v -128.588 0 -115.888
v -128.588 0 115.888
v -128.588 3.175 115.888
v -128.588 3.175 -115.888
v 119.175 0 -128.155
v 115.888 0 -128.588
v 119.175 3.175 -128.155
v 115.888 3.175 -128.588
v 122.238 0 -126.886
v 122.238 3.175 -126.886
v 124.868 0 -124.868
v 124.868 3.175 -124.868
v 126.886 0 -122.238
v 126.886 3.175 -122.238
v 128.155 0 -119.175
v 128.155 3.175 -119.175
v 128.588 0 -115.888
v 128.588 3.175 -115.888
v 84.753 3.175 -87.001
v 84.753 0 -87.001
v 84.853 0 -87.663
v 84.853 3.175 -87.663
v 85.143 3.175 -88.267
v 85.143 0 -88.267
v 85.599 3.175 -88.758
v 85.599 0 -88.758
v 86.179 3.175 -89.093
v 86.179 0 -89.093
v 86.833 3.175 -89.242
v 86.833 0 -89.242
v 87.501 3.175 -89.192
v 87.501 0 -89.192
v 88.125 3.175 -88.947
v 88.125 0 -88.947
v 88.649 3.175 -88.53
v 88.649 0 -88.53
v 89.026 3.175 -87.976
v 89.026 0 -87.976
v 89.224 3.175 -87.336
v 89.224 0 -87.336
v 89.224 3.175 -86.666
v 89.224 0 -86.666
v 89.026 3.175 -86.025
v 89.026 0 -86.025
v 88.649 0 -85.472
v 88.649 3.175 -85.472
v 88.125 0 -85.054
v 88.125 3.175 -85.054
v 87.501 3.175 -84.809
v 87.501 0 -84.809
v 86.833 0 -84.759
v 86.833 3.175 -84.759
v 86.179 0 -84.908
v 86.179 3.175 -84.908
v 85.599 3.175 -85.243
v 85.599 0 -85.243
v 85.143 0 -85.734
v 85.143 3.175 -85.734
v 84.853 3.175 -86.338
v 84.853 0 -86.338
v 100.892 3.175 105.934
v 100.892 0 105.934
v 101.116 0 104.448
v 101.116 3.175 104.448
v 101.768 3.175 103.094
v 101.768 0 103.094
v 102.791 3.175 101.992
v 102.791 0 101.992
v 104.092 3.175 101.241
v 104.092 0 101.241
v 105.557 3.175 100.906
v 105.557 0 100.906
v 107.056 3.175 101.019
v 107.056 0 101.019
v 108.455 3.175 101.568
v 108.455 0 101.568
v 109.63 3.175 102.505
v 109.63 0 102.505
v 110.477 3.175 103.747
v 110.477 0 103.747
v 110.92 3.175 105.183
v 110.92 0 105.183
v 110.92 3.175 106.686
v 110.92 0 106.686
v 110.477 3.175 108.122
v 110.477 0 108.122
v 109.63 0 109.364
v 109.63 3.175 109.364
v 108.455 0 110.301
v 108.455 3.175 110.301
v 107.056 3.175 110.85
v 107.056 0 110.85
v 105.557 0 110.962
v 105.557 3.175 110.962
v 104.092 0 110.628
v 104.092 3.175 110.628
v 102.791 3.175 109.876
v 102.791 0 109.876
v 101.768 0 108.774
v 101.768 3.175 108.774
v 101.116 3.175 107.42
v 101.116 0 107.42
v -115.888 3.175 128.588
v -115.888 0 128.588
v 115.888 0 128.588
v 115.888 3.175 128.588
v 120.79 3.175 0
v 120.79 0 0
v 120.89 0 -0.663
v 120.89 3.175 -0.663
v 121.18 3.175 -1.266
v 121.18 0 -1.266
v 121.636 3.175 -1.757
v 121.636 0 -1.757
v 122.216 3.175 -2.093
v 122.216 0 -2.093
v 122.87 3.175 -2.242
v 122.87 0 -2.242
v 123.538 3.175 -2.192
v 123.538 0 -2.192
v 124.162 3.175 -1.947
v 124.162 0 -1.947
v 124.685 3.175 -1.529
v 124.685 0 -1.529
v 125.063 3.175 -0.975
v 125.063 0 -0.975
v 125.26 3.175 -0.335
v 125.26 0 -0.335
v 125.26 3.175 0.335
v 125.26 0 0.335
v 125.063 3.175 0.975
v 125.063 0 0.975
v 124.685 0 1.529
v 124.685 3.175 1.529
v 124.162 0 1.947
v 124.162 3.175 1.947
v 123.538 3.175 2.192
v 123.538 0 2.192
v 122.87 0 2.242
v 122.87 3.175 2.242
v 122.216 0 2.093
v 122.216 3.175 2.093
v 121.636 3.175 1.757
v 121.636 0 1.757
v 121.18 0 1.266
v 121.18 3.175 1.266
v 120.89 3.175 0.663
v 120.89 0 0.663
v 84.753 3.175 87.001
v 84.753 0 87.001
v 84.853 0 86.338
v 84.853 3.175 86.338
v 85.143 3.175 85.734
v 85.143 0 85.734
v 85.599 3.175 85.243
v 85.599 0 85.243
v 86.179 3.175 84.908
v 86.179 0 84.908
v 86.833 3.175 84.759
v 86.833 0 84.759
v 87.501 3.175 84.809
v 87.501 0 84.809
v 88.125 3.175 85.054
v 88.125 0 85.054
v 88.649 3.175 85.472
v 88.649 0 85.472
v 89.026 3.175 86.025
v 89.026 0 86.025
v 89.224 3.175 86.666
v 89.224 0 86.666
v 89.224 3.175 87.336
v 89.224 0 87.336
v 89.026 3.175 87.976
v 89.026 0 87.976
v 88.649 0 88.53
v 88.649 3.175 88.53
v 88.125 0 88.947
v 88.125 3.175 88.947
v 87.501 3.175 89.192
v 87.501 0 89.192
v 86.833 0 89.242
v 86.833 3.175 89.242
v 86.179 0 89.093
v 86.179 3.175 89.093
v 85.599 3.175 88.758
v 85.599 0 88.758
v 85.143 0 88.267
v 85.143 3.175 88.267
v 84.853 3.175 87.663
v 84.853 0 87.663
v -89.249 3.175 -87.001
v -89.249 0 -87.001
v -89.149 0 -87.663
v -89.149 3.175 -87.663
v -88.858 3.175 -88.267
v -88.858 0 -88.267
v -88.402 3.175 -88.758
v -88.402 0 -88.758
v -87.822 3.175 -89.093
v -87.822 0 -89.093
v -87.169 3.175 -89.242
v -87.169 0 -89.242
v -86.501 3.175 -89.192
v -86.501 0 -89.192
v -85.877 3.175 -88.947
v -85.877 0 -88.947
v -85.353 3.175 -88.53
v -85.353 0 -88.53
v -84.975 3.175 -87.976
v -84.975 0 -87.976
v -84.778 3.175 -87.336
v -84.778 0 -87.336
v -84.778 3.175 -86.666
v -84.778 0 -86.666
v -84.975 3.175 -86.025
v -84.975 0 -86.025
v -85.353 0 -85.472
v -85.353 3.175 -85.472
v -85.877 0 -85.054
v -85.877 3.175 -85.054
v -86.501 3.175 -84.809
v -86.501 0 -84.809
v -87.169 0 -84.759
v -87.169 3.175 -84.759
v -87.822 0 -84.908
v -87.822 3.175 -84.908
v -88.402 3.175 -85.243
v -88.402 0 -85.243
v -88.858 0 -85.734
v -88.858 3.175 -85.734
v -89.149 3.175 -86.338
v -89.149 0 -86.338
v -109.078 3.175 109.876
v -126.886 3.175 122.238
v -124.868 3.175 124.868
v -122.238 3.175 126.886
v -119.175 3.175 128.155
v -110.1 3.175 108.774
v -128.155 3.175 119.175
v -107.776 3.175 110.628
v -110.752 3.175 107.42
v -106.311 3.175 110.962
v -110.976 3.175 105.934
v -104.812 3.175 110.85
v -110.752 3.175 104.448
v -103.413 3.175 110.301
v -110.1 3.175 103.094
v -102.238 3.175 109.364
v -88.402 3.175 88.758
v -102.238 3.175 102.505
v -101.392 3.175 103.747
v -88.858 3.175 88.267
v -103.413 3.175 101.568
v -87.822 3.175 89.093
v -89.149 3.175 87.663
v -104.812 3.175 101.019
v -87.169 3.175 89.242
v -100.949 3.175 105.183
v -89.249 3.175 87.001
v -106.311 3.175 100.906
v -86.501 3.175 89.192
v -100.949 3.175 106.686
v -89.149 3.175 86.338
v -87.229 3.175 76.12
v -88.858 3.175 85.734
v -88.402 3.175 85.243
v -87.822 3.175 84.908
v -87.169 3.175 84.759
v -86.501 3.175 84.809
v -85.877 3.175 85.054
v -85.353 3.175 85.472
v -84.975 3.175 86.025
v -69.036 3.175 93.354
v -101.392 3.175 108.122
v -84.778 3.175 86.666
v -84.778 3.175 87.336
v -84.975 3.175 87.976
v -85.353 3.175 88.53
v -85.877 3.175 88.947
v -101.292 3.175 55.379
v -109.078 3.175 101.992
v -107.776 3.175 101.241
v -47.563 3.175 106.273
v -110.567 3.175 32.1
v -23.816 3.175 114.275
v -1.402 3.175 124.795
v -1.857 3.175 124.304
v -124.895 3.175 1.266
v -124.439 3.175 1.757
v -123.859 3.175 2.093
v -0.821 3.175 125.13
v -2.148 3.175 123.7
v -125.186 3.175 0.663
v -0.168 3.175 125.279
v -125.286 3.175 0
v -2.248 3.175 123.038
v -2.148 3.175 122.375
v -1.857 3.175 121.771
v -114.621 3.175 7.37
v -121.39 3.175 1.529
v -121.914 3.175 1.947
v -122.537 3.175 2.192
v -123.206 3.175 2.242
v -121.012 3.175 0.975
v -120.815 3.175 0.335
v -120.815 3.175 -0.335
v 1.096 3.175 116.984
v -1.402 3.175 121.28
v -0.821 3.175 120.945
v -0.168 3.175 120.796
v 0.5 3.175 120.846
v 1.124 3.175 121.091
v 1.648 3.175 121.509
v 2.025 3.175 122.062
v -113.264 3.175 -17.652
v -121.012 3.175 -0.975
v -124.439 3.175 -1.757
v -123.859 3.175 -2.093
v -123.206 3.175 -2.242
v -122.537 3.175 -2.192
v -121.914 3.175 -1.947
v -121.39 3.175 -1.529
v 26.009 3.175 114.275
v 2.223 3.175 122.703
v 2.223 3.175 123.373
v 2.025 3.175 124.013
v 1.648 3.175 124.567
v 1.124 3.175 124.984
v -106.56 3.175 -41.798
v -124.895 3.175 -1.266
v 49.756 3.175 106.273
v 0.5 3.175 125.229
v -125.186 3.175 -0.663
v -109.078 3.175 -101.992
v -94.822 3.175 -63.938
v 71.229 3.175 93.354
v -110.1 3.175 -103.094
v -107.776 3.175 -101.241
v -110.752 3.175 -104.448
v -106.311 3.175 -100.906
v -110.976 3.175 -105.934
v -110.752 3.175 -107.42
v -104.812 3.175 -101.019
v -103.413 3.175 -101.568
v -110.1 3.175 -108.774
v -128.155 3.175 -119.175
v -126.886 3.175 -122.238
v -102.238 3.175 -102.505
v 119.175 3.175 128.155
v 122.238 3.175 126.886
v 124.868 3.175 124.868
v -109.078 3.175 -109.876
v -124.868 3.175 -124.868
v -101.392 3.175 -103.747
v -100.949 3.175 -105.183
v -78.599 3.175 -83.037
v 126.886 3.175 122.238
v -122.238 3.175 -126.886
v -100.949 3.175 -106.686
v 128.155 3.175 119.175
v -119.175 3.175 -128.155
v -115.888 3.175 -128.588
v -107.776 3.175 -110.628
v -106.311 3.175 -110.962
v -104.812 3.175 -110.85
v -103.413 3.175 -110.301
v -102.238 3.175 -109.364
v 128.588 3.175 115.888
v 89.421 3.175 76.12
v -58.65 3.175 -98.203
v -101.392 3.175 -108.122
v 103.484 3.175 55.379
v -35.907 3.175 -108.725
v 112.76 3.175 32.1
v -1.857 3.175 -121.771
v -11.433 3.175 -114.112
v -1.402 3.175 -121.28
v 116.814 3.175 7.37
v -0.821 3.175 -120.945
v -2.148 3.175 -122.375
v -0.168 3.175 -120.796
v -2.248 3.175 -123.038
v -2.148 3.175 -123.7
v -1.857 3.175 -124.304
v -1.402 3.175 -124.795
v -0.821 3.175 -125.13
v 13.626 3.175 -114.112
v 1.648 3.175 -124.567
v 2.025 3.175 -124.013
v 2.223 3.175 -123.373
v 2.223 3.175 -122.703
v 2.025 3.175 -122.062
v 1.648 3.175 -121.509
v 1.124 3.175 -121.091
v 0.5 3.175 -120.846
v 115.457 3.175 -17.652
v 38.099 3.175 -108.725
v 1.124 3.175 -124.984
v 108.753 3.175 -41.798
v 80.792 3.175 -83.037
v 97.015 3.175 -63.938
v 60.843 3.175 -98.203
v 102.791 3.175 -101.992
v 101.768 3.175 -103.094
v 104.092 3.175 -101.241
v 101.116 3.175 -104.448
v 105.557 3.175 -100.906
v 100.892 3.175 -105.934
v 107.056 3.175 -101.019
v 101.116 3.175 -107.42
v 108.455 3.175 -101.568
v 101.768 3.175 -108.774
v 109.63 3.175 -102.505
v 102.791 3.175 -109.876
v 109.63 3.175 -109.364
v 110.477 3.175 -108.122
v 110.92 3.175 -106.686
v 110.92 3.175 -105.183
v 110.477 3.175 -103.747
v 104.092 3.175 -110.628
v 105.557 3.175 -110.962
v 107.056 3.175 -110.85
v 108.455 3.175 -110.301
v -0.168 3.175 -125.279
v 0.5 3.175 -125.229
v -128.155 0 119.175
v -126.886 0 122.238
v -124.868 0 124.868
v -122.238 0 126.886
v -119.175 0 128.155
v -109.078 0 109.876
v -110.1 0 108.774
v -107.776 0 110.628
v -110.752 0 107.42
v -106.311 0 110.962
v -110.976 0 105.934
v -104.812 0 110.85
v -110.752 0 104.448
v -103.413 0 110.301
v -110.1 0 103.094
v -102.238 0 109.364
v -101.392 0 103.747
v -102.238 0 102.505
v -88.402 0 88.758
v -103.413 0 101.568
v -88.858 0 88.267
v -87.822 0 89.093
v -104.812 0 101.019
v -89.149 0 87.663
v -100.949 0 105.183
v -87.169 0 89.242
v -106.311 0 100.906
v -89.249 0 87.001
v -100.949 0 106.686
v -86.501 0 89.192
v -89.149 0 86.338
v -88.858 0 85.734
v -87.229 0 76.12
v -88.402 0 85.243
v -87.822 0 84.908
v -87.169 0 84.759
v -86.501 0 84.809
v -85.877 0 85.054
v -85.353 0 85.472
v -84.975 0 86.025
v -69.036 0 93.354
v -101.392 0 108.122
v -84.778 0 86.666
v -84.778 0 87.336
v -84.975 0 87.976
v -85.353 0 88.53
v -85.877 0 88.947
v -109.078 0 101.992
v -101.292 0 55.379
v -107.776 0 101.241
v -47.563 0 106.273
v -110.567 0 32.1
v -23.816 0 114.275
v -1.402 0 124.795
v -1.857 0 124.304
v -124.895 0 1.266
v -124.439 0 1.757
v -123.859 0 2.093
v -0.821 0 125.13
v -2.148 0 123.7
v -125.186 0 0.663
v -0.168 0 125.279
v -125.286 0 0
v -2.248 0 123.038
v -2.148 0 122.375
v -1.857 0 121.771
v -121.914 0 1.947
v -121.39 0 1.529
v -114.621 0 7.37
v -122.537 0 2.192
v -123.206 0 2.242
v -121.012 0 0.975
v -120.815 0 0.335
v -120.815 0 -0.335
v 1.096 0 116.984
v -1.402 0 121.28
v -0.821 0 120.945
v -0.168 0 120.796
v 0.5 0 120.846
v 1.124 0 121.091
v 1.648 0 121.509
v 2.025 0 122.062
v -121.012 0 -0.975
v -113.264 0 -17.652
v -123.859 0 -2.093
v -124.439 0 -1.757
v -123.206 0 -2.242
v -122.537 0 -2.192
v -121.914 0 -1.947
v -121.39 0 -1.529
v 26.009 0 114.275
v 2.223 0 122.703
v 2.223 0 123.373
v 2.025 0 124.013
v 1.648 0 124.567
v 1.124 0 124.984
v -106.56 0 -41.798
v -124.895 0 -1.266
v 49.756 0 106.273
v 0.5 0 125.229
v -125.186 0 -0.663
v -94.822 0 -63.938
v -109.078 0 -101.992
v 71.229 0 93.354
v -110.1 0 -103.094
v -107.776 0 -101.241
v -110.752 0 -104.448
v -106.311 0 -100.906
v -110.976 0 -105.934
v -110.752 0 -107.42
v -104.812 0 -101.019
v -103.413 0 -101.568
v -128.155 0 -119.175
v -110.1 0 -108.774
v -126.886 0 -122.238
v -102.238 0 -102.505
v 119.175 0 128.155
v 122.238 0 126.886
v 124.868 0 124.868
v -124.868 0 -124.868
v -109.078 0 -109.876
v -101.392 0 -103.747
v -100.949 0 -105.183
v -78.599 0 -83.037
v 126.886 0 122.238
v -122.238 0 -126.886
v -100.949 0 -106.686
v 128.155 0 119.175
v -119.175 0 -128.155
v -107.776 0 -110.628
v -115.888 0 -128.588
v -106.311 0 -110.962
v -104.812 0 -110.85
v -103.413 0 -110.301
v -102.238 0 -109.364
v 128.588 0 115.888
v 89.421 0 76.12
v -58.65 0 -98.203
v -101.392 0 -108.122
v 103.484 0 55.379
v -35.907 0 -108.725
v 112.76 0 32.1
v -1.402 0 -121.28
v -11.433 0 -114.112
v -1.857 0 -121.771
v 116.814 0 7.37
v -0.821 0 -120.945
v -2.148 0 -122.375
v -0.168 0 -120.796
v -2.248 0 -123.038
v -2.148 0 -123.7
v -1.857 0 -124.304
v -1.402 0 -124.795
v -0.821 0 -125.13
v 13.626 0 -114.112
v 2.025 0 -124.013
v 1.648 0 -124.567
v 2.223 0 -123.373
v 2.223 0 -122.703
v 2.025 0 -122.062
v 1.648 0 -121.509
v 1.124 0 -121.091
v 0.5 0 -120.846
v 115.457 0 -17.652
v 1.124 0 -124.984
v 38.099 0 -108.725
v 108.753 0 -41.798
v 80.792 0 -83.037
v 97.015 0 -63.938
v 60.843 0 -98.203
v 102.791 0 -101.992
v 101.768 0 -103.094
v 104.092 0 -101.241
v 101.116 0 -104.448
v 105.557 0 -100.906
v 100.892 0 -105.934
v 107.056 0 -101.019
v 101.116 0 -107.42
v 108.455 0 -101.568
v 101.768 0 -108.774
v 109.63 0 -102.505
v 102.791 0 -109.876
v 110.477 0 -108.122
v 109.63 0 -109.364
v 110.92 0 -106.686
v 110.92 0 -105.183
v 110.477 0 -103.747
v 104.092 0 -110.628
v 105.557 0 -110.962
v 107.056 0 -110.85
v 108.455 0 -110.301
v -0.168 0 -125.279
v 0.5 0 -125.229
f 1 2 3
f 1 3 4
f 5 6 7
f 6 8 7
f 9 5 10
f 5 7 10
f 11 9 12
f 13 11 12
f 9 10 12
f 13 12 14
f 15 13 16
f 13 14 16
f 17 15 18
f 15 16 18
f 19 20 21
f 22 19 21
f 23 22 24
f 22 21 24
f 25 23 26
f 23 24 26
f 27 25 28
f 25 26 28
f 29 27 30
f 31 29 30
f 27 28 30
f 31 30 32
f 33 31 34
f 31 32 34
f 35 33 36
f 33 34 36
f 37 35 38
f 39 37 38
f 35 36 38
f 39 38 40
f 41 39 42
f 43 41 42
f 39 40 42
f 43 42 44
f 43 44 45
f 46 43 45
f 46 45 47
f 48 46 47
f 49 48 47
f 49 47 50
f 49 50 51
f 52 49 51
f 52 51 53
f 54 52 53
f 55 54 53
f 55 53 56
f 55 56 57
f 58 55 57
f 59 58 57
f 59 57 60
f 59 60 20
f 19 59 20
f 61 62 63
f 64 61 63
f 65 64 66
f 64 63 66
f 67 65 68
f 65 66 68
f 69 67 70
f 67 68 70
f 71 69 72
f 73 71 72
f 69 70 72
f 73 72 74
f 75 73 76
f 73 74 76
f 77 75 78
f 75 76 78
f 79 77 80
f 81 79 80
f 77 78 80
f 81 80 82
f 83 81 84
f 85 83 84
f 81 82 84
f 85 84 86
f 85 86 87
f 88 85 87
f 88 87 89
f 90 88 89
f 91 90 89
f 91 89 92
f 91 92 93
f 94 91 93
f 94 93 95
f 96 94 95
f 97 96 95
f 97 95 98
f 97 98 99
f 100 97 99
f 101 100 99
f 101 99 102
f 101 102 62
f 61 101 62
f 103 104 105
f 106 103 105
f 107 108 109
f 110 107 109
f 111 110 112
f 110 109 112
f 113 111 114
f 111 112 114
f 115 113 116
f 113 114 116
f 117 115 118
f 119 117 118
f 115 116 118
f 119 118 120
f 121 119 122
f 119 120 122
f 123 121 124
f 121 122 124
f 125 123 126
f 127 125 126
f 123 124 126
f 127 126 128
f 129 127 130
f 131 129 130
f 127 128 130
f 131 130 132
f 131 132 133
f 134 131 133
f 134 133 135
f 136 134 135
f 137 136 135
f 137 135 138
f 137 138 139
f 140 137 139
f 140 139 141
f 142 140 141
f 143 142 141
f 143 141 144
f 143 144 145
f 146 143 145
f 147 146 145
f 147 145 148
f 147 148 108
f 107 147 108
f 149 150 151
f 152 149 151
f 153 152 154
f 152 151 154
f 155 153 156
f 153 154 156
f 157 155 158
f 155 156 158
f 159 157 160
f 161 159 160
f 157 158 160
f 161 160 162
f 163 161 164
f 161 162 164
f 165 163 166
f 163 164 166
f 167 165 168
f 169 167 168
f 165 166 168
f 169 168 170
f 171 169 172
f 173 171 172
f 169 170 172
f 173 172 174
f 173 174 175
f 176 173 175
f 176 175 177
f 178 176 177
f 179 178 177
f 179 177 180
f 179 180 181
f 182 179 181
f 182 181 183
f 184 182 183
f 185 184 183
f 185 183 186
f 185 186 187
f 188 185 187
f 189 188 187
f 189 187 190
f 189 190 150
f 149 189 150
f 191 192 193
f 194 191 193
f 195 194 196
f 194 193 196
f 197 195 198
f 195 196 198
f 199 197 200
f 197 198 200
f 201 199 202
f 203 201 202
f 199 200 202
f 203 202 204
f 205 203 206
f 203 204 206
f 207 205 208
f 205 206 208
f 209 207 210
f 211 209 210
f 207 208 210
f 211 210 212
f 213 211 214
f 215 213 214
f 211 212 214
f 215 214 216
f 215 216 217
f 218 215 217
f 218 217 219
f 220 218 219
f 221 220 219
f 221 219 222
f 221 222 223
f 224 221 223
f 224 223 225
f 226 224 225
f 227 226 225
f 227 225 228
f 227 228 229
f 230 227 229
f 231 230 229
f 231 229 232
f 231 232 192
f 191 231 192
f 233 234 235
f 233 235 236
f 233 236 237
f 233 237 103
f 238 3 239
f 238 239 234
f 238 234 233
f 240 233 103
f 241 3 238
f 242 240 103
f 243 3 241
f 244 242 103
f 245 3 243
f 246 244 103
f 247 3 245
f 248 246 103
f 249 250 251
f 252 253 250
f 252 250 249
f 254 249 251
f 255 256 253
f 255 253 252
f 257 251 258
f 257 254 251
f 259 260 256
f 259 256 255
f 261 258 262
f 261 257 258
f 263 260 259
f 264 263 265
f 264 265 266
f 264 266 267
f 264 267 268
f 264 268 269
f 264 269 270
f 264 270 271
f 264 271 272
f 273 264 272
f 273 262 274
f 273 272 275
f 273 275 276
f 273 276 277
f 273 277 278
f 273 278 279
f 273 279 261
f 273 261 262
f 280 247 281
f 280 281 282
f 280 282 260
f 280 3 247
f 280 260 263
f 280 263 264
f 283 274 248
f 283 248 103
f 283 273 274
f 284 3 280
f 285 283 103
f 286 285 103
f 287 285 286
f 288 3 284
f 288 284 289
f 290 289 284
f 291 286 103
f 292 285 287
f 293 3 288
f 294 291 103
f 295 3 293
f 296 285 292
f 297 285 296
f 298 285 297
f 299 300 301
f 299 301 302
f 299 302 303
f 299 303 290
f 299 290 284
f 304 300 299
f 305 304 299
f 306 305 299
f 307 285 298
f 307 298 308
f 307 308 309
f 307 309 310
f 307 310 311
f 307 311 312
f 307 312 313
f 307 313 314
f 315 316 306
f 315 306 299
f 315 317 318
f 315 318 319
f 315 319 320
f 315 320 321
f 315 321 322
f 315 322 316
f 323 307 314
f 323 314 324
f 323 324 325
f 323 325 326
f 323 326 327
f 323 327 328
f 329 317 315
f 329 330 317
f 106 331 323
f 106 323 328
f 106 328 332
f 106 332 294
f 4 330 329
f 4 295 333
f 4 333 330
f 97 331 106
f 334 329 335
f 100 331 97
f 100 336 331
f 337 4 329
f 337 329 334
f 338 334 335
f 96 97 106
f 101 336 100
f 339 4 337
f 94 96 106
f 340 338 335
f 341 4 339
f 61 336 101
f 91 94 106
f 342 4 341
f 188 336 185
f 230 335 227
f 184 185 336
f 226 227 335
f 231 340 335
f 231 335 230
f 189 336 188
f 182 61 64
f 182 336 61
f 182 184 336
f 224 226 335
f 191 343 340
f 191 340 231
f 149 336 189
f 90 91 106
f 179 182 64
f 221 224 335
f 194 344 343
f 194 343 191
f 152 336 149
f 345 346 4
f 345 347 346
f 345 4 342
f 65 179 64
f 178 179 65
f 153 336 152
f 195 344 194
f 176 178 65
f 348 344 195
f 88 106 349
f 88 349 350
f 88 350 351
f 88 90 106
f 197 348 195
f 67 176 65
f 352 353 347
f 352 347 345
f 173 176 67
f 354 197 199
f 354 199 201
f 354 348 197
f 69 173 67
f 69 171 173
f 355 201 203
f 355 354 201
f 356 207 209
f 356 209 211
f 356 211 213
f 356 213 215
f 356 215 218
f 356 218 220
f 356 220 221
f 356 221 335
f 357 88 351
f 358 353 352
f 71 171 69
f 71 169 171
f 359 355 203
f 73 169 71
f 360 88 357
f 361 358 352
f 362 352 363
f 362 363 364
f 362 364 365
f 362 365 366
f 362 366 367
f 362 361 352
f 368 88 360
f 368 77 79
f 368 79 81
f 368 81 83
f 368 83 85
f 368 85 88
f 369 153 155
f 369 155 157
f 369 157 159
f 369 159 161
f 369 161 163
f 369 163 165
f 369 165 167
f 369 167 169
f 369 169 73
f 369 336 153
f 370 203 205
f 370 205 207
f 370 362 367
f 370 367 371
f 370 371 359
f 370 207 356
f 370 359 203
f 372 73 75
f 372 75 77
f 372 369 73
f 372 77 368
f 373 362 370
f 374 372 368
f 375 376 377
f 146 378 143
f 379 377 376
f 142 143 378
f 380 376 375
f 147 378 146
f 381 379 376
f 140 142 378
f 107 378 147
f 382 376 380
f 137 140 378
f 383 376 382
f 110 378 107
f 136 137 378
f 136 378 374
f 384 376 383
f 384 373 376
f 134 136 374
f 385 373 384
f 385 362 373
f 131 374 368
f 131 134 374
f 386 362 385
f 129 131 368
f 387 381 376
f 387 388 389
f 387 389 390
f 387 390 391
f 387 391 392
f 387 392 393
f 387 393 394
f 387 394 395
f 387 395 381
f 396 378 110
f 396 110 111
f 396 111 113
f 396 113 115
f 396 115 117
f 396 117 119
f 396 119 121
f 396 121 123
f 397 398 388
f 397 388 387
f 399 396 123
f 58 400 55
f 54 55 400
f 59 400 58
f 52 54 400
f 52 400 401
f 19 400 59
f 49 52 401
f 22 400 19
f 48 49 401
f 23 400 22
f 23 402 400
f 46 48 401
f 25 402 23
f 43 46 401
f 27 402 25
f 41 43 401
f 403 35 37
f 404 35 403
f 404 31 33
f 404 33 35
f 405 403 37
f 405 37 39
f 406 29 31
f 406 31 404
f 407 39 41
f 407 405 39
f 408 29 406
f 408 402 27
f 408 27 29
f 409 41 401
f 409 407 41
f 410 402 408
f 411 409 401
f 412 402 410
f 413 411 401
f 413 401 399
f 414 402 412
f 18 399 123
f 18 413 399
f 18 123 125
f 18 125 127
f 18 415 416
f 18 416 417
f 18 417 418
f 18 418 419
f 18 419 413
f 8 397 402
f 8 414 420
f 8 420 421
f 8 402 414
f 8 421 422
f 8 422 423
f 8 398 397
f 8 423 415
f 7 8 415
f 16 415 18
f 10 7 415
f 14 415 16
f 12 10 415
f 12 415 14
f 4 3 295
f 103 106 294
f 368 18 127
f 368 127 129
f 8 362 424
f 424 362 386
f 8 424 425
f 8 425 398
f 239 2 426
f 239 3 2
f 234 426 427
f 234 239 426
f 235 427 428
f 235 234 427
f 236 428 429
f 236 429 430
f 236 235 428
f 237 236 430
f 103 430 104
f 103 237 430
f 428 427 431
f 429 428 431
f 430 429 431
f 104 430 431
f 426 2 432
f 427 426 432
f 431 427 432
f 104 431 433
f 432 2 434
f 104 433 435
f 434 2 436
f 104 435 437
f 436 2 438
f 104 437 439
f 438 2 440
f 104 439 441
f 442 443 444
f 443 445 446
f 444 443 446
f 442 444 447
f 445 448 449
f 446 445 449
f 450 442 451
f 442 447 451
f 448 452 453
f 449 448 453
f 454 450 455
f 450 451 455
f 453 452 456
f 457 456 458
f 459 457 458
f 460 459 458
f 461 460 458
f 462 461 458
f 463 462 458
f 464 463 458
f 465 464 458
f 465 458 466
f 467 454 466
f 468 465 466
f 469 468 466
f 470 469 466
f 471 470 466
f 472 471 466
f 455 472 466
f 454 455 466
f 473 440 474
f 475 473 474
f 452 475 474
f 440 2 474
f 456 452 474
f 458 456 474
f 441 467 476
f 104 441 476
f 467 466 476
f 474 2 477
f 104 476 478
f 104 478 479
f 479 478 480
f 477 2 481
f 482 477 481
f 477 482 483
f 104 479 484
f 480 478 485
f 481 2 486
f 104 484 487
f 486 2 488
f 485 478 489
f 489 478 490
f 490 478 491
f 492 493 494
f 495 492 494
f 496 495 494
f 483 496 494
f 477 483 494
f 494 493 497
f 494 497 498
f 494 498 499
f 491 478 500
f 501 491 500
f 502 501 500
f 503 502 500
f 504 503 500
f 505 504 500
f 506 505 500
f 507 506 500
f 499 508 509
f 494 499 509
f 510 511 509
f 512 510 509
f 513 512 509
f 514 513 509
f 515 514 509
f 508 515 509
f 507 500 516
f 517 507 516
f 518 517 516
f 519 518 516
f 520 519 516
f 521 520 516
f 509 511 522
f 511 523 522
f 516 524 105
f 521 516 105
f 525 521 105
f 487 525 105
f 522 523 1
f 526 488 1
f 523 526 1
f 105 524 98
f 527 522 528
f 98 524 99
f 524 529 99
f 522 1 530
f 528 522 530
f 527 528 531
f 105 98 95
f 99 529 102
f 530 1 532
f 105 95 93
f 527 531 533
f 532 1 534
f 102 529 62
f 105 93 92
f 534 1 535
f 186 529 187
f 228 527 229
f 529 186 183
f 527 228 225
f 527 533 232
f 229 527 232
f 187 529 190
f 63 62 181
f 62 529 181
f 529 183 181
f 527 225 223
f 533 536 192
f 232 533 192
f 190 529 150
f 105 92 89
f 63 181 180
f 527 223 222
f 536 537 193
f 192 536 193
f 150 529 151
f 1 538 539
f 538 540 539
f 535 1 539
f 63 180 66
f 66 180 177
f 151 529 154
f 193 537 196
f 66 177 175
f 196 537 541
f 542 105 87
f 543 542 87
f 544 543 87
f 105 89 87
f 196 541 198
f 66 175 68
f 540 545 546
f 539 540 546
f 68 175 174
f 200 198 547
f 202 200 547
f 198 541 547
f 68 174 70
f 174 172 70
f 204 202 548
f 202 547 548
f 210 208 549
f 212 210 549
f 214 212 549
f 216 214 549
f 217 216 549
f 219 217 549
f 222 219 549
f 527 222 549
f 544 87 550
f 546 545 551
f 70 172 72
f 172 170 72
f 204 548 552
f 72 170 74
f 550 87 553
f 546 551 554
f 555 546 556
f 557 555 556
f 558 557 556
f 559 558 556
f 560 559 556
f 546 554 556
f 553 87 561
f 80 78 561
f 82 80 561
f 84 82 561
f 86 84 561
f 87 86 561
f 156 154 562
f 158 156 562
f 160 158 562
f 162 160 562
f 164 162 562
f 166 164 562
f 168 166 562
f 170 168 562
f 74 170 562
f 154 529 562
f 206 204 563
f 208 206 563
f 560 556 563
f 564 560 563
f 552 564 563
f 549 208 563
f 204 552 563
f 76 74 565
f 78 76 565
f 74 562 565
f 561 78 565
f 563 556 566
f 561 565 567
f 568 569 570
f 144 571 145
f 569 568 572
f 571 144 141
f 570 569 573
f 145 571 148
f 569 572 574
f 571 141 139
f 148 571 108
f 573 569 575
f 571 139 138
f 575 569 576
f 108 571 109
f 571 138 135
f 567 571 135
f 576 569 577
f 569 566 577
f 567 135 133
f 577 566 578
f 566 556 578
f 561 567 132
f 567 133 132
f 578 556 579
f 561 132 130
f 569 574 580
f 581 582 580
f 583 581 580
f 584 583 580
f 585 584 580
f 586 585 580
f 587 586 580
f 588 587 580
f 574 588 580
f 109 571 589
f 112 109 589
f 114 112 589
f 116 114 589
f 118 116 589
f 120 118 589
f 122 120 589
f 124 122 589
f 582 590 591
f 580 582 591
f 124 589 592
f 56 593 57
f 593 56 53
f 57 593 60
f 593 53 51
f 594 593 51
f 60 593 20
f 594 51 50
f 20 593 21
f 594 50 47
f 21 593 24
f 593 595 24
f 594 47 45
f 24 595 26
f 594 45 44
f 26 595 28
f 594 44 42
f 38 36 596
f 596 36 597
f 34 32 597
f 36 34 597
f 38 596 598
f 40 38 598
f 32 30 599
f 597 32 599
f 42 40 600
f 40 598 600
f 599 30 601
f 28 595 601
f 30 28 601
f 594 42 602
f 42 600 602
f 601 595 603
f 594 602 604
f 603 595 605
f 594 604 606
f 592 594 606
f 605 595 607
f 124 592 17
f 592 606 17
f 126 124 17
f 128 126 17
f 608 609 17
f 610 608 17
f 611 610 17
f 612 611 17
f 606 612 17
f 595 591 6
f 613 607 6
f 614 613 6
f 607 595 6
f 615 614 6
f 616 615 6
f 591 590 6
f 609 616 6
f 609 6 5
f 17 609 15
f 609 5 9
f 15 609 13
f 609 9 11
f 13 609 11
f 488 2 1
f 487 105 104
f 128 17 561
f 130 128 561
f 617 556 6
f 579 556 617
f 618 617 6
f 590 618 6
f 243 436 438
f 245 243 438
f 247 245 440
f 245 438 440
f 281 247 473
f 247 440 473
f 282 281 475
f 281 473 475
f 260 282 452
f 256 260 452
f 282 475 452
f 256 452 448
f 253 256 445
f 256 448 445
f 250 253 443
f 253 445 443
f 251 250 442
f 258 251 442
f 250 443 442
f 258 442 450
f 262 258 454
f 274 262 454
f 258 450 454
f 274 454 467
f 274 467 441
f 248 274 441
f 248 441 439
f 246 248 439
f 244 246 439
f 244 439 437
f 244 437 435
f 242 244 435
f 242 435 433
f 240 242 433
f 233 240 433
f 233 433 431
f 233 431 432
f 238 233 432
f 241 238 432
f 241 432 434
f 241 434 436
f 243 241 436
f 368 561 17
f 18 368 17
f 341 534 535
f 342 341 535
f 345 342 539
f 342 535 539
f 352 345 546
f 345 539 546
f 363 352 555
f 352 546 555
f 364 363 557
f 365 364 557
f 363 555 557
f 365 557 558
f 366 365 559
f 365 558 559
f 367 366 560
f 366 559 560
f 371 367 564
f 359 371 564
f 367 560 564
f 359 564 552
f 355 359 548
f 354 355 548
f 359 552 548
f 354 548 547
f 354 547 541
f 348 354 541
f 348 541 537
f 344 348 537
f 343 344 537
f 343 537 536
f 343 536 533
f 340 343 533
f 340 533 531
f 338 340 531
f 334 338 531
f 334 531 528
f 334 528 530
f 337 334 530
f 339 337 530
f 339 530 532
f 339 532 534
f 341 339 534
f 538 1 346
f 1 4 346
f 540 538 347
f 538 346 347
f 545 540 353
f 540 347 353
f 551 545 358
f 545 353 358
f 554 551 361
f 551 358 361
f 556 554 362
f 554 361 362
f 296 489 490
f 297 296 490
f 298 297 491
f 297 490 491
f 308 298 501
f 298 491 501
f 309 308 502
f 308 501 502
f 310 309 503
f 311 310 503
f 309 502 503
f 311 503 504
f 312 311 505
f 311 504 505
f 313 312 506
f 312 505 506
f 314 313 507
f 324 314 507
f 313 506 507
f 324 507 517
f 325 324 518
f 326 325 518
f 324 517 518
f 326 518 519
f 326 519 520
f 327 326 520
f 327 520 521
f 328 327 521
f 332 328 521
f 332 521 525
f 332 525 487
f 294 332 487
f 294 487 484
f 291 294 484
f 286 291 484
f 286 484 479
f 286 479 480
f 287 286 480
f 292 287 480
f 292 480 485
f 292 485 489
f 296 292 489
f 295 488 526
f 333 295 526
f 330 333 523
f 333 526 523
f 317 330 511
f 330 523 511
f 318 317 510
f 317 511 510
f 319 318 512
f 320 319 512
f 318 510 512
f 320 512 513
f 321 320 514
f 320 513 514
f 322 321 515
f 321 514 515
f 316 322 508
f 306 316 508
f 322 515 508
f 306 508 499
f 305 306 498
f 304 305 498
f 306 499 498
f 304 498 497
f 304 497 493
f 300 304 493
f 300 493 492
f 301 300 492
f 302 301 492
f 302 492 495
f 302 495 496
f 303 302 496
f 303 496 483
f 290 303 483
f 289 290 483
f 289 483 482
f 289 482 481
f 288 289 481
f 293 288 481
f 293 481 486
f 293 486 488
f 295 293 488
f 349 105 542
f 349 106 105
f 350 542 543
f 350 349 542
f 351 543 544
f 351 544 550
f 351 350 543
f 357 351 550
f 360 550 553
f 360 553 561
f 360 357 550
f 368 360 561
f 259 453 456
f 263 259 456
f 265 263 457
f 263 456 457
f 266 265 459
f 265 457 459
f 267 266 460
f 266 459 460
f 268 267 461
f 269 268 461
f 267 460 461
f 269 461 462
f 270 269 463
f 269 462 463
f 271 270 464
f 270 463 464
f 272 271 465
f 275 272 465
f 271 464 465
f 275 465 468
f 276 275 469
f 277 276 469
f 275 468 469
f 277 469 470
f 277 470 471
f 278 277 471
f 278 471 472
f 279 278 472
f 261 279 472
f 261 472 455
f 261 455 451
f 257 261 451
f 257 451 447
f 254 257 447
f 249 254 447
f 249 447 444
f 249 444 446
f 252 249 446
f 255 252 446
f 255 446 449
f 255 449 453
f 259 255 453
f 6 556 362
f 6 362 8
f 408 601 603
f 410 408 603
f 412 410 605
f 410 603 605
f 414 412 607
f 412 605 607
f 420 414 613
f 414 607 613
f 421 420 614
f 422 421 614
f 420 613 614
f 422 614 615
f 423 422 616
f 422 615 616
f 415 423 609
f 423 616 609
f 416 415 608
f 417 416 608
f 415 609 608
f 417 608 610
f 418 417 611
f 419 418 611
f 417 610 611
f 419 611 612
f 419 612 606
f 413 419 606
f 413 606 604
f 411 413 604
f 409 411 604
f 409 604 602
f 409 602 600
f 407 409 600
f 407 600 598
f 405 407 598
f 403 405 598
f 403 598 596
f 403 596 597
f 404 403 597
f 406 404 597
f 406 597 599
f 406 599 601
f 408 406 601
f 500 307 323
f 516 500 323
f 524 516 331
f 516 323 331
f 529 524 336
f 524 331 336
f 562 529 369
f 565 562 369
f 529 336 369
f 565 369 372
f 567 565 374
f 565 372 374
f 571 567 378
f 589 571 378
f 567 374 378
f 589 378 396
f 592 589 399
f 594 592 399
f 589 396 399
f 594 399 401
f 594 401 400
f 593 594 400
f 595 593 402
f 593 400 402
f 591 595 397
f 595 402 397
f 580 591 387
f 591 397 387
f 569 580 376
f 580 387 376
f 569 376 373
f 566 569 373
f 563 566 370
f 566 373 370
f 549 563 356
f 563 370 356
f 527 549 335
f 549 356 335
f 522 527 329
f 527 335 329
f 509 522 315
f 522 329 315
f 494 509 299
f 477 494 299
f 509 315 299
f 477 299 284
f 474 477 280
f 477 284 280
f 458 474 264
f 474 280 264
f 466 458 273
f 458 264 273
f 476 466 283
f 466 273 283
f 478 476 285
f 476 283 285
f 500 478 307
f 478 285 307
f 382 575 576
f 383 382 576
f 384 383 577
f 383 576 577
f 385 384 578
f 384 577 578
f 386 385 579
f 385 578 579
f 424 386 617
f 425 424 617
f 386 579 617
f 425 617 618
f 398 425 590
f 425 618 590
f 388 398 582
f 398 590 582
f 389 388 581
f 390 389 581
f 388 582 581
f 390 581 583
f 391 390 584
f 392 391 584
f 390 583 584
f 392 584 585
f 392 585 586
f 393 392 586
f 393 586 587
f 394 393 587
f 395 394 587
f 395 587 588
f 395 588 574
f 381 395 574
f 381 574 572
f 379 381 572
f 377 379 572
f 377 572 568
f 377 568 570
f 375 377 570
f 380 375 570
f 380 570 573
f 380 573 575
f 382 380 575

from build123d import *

# Parameters (mm, degrees)
SKETCH1_W               = 257.175
SKETCH1_H               = 257.175
BOSS_EXTRUDE1_DEPTH     = 3.175
SKETCH2_R               = 115.8875
CUT_EXTRUDE1_DEPTH      = 3.175
F_8_CLEARANCE_HOLE1_D   = 4.4958
FILLET1_R               = 12.7
F_3_8_CLEARANCE_HOLE1_D = 10.0838


with BuildPart() as part:
    # Sketch1 → Boss-Extrude1 (new body)
    with BuildSketch(Plane(origin=(0, 0, 0), x_dir=(1, 0, 0), z_dir=(0, 1, 0))):
        Rectangle(SKETCH1_W, SKETCH1_H)
    extrude(amount=BOSS_EXTRUDE1_DEPTH)

    # Sketch2 → Cut-Extrude1 (cut)
    with BuildSketch(Plane(origin=(0, 3.175, 0), x_dir=(1, 0, 0), z_dir=(0, 1, 0))):
        with Locations(Location((1.096399637, -1.096399637, 0), (0, 0, 270))):
            Circle(SKETCH2_R)
    extrude(amount=-CUT_EXTRUDE1_DEPTH, mode=Mode.SUBTRACT)

    # #8 Clearance Hole1 (through all)
    with Locations(Plane(origin=(0, 3.175, 0), x_dir=(1, 0, 0), z_dir=(0, 1, 0))):
        with Locations((87.000721301, -87.000721301), (123.0376, 0), (87.000721301, 87.000721301), (0, 123.0376), (-87.000721301, 87.000721301), (-123.0376, 0), (-87.000721301, -87.000721301), (0, -123.0376)):
            Hole(F_8_CLEARANCE_HOLE1_D / 2)

    # Fillet1
    fillet1_edges = [part.edges().sort_by_distance(p)[0] for p in [
        (128.5875, 1.5875, 128.5875),
        (-128.5875, 1.5875, 128.5875),
        (-128.5875, 1.5875, -128.5875),
        (128.5875, 1.5875, -128.5875),
    ]]
    fillet(fillet1_edges, radius=FILLET1_R)

    # 3/8 Clearance Hole1 (through all)
    with Locations(Plane(origin=(0, 3.175, 0), x_dir=(1, 0, 0), z_dir=(0, 1, 0))):
        with Locations((105.934238711, -105.934238711), (105.934238711, 105.934238711), (-105.934238711, -105.934238711), (-105.934238711, 105.934238711)):
            Hole(F_3_8_CLEARANCE_HOLE1_D / 2)


solid = part.part
